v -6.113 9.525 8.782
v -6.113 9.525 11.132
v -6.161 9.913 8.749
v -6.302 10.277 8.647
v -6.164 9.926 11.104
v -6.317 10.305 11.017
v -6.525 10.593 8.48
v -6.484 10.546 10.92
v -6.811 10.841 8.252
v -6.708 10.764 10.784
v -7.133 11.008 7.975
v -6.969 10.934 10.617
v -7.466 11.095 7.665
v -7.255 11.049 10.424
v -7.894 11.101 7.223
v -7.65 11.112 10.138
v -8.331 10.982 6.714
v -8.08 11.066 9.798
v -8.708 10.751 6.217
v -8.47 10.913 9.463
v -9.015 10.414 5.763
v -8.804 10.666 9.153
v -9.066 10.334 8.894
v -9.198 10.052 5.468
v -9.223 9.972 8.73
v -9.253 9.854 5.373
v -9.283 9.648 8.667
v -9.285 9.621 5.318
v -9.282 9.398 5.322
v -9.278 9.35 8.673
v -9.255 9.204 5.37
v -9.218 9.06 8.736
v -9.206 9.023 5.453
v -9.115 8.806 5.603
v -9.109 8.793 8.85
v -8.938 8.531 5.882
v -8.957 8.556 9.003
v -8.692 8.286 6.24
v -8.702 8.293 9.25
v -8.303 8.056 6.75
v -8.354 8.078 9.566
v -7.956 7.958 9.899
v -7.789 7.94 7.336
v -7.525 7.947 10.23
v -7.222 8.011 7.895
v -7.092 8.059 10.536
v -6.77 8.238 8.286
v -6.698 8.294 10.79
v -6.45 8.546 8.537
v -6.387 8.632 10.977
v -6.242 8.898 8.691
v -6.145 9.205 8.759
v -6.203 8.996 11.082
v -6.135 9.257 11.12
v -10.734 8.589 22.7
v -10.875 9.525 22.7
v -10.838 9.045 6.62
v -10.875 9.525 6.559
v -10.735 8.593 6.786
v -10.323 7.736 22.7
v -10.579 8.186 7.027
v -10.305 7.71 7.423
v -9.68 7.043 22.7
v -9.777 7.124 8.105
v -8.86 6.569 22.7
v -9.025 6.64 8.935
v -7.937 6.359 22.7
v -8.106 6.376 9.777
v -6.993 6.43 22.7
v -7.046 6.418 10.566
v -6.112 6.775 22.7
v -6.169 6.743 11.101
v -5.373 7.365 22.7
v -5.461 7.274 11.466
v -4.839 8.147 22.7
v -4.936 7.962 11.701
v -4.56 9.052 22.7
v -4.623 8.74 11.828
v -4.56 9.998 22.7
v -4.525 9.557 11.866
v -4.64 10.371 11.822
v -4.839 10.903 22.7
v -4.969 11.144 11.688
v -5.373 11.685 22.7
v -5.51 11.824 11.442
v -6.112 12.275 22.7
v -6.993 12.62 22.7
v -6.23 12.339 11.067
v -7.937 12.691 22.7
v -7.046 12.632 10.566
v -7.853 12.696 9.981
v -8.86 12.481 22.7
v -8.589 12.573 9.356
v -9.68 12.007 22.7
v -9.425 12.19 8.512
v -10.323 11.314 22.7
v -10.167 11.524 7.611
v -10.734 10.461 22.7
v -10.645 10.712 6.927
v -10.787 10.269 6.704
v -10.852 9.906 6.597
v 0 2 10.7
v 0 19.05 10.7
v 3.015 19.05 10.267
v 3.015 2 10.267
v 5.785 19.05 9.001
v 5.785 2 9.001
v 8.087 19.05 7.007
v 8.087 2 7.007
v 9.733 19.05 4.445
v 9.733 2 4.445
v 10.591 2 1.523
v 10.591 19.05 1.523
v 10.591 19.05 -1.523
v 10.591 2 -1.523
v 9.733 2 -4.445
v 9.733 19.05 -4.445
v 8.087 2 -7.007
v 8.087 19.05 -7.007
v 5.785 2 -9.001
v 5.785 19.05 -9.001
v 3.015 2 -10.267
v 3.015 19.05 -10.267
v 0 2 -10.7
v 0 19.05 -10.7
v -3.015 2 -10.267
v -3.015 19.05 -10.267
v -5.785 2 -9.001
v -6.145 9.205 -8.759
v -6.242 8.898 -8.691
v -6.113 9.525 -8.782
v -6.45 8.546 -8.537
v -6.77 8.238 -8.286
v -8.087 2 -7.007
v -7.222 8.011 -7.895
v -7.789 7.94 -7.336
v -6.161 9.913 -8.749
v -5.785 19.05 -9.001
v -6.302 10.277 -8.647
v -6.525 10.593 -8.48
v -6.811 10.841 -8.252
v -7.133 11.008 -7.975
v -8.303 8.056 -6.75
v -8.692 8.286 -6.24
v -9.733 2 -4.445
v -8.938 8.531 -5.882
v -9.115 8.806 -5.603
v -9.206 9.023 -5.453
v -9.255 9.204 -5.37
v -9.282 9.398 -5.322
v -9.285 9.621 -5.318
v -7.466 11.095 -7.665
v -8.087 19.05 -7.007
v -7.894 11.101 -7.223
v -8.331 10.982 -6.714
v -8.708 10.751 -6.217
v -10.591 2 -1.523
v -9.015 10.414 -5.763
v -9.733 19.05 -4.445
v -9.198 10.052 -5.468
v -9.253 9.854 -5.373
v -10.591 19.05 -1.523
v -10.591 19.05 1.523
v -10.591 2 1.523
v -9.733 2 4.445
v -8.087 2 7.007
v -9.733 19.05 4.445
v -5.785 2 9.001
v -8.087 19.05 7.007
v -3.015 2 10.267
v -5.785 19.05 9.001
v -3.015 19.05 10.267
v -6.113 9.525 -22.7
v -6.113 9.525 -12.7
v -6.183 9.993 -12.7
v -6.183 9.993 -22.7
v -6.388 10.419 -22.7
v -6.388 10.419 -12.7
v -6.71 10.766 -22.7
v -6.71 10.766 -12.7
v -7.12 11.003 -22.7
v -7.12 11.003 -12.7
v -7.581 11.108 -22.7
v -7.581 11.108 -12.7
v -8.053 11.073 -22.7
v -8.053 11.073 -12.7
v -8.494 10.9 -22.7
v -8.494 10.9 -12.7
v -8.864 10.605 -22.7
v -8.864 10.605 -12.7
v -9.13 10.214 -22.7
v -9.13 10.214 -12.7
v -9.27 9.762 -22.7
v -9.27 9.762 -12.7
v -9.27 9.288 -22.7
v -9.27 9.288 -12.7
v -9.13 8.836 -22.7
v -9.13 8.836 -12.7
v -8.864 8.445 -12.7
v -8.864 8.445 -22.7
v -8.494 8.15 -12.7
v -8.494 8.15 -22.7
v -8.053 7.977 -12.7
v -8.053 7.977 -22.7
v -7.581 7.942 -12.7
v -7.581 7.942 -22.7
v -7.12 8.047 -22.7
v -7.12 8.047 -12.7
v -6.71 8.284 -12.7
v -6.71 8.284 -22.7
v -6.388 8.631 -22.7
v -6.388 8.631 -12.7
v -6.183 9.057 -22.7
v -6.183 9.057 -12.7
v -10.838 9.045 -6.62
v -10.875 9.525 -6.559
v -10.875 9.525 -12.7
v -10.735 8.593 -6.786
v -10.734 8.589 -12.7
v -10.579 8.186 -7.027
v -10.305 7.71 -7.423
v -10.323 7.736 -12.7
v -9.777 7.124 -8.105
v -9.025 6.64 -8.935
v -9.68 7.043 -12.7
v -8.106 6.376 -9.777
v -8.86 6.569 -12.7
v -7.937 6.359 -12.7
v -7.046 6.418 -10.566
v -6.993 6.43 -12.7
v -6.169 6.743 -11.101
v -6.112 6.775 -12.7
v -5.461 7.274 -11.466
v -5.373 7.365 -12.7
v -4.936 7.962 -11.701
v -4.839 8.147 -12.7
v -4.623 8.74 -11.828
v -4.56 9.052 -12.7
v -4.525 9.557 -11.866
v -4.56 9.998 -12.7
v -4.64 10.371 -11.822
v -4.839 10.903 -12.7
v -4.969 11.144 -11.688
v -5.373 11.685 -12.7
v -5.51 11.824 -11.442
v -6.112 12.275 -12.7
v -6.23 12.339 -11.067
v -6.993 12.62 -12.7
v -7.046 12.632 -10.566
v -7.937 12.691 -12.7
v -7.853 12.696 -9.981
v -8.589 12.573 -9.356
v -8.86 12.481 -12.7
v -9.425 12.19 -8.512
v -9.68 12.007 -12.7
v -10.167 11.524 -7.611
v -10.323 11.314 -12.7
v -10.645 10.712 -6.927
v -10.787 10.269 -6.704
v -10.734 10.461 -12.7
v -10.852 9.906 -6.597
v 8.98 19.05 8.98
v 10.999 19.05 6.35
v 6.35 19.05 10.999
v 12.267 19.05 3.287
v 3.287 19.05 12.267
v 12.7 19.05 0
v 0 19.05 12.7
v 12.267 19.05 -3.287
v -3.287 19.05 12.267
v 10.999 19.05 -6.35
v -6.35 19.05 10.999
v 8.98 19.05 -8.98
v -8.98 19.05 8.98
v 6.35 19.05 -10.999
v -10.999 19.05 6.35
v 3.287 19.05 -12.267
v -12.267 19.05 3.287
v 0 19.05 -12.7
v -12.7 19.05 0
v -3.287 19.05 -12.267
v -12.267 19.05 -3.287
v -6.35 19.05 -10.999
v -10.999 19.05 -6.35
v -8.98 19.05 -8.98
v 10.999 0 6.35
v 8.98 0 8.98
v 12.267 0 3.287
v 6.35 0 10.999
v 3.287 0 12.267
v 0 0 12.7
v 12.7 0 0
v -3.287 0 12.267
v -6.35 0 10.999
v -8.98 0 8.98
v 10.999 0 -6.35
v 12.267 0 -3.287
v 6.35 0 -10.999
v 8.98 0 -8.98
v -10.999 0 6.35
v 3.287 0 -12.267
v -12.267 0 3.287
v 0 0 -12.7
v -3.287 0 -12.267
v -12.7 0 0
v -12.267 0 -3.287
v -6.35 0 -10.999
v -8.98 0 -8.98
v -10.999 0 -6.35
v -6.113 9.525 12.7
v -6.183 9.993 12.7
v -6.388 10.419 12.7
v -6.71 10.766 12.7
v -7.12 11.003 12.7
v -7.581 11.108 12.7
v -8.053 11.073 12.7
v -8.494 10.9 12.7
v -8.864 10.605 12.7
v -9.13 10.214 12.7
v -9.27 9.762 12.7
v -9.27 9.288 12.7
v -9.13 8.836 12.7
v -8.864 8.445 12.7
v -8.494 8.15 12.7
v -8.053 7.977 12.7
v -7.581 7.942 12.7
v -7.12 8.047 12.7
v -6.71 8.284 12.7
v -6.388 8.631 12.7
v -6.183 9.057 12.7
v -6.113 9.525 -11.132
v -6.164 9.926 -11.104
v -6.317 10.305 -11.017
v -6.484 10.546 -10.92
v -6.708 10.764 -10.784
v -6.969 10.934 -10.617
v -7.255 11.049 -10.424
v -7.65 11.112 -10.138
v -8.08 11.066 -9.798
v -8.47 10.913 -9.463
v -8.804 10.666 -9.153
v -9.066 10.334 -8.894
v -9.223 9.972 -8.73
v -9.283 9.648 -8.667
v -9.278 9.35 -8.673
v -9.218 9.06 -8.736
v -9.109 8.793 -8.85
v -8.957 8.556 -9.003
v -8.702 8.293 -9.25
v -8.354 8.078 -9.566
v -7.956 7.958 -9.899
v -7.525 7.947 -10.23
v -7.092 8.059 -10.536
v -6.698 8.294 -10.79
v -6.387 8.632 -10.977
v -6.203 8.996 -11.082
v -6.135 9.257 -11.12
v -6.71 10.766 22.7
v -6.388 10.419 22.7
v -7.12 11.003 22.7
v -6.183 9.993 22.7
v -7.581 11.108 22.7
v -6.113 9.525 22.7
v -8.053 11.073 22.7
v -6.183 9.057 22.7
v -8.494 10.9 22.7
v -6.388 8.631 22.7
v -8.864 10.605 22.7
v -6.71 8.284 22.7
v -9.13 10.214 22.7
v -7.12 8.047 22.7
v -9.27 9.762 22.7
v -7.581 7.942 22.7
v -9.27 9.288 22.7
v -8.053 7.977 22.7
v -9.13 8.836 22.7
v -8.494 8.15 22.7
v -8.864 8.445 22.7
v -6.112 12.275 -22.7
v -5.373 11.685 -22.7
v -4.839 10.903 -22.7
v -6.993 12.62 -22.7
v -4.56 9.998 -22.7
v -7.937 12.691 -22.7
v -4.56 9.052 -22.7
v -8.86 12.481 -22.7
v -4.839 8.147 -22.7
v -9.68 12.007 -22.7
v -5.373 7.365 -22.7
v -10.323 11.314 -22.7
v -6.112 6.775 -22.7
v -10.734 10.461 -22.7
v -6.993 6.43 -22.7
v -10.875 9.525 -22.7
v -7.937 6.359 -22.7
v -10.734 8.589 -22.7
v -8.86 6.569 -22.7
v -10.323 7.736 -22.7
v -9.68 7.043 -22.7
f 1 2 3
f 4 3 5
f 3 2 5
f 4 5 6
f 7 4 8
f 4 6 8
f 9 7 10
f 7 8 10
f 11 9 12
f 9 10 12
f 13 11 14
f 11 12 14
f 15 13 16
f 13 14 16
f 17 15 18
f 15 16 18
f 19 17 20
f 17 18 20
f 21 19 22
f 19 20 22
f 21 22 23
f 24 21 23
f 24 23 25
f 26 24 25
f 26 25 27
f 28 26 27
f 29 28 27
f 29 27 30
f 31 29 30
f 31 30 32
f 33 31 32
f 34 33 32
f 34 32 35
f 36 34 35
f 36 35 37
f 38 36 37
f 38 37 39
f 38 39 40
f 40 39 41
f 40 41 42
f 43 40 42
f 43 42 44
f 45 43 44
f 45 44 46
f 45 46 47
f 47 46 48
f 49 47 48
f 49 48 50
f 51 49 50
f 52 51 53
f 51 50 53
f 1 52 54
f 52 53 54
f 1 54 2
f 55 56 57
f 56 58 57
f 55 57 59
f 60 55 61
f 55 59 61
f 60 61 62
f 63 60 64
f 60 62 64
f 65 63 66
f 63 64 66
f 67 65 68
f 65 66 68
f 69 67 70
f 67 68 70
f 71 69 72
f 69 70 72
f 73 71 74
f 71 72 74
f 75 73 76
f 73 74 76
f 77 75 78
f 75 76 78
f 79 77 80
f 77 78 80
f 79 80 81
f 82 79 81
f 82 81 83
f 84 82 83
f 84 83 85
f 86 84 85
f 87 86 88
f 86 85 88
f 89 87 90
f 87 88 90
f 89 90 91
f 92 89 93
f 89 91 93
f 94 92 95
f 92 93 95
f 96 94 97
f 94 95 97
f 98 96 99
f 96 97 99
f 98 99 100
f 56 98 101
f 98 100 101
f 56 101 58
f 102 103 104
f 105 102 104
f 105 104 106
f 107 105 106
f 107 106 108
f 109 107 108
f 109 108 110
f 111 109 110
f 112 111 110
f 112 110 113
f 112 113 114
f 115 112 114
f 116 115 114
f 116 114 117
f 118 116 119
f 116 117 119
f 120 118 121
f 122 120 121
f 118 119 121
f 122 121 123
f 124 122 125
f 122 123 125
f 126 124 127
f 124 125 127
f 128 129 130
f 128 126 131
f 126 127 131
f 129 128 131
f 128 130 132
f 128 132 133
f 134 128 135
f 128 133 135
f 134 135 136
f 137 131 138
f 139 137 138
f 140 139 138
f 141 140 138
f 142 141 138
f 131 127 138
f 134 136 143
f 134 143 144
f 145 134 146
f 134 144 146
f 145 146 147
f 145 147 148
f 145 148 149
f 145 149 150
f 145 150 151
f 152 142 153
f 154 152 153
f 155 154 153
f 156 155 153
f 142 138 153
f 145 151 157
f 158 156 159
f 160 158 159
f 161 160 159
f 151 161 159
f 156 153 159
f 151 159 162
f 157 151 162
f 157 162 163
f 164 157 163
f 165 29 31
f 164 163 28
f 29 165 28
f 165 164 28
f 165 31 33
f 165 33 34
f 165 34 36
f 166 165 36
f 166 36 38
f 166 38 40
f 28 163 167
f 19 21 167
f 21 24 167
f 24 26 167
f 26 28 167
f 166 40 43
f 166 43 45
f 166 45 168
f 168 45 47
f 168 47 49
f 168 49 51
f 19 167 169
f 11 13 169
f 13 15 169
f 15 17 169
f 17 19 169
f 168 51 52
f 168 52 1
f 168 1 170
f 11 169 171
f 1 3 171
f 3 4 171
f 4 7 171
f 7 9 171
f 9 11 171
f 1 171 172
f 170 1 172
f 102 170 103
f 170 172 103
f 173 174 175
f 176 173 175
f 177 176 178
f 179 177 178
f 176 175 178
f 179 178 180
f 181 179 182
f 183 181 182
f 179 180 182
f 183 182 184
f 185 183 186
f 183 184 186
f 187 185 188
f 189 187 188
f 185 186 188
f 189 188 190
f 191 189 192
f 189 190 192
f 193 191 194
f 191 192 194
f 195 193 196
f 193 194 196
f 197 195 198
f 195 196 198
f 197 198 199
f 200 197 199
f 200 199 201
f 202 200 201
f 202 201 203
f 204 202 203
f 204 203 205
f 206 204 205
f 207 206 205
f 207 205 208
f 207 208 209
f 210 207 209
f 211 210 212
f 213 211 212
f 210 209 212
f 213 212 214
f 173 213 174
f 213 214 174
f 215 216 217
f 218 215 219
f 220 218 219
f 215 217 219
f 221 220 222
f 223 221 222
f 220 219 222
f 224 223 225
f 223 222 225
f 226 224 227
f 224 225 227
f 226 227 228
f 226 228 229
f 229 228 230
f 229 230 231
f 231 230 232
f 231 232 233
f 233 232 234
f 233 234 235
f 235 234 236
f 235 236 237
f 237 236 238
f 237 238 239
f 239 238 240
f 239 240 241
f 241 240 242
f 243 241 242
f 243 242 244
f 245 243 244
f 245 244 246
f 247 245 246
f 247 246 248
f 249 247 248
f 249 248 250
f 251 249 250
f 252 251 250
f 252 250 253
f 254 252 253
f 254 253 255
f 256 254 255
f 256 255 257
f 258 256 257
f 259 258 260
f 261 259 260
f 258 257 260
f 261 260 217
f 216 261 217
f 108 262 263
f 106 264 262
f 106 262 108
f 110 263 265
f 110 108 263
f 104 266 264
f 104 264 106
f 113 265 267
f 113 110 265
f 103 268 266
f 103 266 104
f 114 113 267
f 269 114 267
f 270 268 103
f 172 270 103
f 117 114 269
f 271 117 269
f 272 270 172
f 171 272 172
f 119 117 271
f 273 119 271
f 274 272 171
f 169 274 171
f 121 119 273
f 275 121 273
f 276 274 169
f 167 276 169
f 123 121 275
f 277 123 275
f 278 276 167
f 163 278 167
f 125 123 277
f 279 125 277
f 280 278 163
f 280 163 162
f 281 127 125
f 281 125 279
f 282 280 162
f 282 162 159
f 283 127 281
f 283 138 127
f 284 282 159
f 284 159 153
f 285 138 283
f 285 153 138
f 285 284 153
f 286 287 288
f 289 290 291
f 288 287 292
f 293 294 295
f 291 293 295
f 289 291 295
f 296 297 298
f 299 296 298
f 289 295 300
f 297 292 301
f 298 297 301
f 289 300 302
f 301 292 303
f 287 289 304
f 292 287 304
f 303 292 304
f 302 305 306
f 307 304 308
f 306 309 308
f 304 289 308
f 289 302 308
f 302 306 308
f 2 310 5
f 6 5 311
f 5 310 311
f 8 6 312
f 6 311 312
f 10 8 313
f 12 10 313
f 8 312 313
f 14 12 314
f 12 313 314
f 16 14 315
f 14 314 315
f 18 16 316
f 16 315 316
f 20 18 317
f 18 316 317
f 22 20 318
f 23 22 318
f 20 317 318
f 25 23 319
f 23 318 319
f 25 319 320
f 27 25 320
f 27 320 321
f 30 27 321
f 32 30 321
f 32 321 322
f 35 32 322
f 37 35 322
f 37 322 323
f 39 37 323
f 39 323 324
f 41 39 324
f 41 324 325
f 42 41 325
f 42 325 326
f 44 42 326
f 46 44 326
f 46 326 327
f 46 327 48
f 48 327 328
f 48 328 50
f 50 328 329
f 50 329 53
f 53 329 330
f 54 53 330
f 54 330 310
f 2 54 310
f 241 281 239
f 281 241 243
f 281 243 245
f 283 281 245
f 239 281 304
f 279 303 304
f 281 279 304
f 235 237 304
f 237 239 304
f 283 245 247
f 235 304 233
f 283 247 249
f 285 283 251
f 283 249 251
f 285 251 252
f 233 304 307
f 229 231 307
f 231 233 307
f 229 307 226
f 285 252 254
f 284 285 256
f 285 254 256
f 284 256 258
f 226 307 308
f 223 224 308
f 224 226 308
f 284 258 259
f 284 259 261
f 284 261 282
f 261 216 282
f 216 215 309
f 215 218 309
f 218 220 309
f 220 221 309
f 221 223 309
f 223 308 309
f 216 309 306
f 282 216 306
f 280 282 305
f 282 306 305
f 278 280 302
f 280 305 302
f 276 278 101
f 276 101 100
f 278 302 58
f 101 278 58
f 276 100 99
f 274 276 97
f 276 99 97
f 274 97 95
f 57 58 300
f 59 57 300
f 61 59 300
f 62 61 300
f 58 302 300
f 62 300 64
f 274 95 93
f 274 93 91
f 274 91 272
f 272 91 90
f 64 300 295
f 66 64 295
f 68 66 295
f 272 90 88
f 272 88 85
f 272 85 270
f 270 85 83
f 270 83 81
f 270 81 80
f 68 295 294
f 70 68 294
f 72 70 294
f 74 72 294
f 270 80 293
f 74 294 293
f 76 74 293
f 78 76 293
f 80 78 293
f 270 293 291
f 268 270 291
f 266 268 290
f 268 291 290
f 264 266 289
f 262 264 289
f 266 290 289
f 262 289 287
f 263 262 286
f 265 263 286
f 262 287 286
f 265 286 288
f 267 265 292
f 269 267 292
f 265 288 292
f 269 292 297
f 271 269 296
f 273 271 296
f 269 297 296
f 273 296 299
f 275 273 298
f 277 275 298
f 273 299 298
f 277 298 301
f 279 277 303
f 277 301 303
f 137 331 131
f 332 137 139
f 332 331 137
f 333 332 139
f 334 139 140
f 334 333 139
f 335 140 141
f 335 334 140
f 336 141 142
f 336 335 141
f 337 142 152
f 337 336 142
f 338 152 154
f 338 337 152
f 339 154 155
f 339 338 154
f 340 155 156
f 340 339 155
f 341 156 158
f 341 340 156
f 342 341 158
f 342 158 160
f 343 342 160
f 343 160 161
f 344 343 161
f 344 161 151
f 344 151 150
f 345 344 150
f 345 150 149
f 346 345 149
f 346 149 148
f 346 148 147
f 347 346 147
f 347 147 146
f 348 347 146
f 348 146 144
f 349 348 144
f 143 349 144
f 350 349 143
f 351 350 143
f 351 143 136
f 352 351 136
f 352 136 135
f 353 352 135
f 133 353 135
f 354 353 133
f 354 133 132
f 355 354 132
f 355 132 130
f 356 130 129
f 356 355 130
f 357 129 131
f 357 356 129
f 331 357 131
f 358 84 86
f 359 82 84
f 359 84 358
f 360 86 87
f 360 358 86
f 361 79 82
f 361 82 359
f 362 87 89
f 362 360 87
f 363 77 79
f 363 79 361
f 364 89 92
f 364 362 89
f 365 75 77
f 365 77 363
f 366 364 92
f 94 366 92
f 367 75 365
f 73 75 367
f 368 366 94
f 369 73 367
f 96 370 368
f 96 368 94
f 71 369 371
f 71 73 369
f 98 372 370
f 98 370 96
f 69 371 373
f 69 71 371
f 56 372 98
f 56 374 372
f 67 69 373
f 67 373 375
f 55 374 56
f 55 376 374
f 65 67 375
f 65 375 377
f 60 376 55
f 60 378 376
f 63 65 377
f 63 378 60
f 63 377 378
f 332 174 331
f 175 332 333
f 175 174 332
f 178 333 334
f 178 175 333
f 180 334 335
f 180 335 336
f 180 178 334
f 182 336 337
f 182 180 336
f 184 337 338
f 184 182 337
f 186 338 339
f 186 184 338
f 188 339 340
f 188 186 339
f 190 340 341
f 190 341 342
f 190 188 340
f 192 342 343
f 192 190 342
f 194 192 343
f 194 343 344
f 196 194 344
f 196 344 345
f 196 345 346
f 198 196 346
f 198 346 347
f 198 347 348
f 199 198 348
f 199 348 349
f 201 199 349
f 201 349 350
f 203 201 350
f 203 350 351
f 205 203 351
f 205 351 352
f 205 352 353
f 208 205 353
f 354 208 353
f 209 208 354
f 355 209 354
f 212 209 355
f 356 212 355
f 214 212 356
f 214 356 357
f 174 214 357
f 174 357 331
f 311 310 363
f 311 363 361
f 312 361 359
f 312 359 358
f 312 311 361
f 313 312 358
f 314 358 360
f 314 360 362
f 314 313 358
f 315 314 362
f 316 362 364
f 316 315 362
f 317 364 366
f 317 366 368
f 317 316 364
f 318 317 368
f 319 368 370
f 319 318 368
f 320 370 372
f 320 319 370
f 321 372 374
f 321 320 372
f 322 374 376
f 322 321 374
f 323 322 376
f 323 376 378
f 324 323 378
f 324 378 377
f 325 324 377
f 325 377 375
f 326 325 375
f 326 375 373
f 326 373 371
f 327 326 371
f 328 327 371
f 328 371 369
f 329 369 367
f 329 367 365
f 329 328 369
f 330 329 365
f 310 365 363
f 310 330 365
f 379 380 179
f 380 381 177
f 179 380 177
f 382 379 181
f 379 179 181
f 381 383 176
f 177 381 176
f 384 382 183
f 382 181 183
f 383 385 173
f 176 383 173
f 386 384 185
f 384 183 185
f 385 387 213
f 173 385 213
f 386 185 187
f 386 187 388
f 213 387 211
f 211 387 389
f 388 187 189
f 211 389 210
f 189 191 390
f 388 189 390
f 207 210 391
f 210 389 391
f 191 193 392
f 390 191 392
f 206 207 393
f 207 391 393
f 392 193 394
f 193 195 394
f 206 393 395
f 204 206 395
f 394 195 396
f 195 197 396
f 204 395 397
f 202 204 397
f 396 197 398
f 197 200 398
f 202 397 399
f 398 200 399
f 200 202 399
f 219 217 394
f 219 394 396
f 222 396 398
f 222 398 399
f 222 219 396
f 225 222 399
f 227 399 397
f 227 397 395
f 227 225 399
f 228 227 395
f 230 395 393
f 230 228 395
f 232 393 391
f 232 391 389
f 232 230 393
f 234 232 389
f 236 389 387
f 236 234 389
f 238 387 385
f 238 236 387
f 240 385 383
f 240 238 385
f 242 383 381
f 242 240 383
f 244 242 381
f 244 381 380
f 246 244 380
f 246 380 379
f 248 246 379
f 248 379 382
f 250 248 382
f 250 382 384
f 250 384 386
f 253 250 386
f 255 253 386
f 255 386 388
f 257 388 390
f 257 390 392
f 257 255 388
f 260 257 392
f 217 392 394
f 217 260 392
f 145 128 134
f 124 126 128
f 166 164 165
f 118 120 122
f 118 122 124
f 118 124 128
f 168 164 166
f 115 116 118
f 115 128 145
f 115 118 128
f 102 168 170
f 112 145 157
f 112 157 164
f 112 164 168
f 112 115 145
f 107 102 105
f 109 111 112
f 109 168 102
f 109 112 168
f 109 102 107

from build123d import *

# Parameters (mm, degrees)
SKETCH1_R                       = 12.7
BOSS_EXTRUDE1_DEPTH             = 19.05
SKETCH2_R                       = 10.7
CUT_EXTRUDE1_DEPTH              = 17.05
BOSS_EXTRUDE2_REACH             = 36.196
SKETCH3_R                       = 3.175
SKETCH3_R_2                     = 1.5875
BOSS_EXTRUDE2_DIRECTION_2_DEPTH = 10
CUT_EXTRUDE2_REACH              = 44.159
SKETCH4_R                       = 1.5875
CUT_EXTRUDE2_DIRECTION_2_DEPTH  = 43.158658819


with BuildPart() as part:
    # Sketch1 → Boss-Extrude1 (new body)
    with BuildSketch(Plane(origin=(0, 0, 0), x_dir=(1, 0, 0), z_dir=(0, 1, 0))):
        with Locations(Location((0, 0, 0), (0, 0, 90))):
            Circle(SKETCH1_R)
    extrude(amount=BOSS_EXTRUDE1_DEPTH)

    # Sketch2 → Cut-Extrude1 (cut)
    with BuildSketch(Plane(origin=(0, 19.05, 0), x_dir=(1, 0, 0), z_dir=(0, 1, 0))):
        with Locations(Location((0, 0, 0), (0, 0, 270))):
            Circle(SKETCH2_R)
    extrude(amount=-CUT_EXTRUDE1_DEPTH, mode=Mode.SUBTRACT)

    # Sketch3 → Boss-Extrude2 (add, up to next)
    with BuildSketch(Plane.XY.offset(12.7), mode=Mode.PRIVATE) as boss_extrude2_sk1:
        with Locations(Location((-7.7, 9.525, 0), (0, 0, 180))):
            Circle(SKETCH3_R)
        with Locations((-7.7, 9.525)):
            Circle(SKETCH3_R_2, mode=Mode.SUBTRACT)
    boss_extrude2_tool1 = extrude(boss_extrude2_sk1.sketch, amount=-BOSS_EXTRUDE2_REACH, mode=Mode.PRIVATE) - part.part
    boss_extrude2 = boss_extrude2_tool1.solids().sort_by_distance((-4.614803, 9.525, 12.7))[0]
    add(boss_extrude2)

    # Sketch3 → Boss-Extrude2 direction 2 (add)
    with BuildSketch(Plane.XY.offset(12.7)):
        with Locations(Location((-7.7, 9.525, 0), (0, 0, 180))):
            Circle(SKETCH3_R)
        with Locations((-7.7, 9.525)):
            Circle(SKETCH3_R_2, mode=Mode.SUBTRACT)
    boss_extrude2_direction_2 = extrude(amount=BOSS_EXTRUDE2_DIRECTION_2_DEPTH)

    # Sketch4 → Cut-Extrude2 (cut, up to next)
    with BuildSketch(Plane.XY.offset(22.7), mode=Mode.PRIVATE) as cut_extrude2_sk1:
        with Locations((-7.7, 9.525)):
            Circle(SKETCH4_R)
    cut_extrude2_tool1 = extrude(cut_extrude2_sk1.sketch, amount=-CUT_EXTRUDE2_REACH, mode=Mode.PRIVATE) & part.part
    cut_extrude2 = cut_extrude2_tool1.solids().sort_by_distance((-7.7, 9.525, 22.7))[0]
    add(cut_extrude2, mode=Mode.SUBTRACT)

    # Sketch4 → Cut-Extrude2 direction 2 (cut)
    with BuildSketch(Plane.XY.offset(22.7)):
        with Locations((-7.7, 9.525)):
            Circle(SKETCH4_R)
    cut_extrude2_direction_2 = extrude(amount=CUT_EXTRUDE2_DIRECTION_2_DEPTH, mode=Mode.SUBTRACT)

    # Mirror1: Boss-Extrude2, Boss-Extrude2 direction 2, Cut-Extrude2, Cut-Extrude2 direction 2 across plane
    add(boss_extrude2.mirror(Plane.XY))
    add(boss_extrude2_direction_2.mirror(Plane.XY))
    add(cut_extrude2.mirror(Plane.XY), mode=Mode.SUBTRACT)
    add(cut_extrude2_direction_2.mirror(Plane.XY), mode=Mode.SUBTRACT)


solid = part.part
